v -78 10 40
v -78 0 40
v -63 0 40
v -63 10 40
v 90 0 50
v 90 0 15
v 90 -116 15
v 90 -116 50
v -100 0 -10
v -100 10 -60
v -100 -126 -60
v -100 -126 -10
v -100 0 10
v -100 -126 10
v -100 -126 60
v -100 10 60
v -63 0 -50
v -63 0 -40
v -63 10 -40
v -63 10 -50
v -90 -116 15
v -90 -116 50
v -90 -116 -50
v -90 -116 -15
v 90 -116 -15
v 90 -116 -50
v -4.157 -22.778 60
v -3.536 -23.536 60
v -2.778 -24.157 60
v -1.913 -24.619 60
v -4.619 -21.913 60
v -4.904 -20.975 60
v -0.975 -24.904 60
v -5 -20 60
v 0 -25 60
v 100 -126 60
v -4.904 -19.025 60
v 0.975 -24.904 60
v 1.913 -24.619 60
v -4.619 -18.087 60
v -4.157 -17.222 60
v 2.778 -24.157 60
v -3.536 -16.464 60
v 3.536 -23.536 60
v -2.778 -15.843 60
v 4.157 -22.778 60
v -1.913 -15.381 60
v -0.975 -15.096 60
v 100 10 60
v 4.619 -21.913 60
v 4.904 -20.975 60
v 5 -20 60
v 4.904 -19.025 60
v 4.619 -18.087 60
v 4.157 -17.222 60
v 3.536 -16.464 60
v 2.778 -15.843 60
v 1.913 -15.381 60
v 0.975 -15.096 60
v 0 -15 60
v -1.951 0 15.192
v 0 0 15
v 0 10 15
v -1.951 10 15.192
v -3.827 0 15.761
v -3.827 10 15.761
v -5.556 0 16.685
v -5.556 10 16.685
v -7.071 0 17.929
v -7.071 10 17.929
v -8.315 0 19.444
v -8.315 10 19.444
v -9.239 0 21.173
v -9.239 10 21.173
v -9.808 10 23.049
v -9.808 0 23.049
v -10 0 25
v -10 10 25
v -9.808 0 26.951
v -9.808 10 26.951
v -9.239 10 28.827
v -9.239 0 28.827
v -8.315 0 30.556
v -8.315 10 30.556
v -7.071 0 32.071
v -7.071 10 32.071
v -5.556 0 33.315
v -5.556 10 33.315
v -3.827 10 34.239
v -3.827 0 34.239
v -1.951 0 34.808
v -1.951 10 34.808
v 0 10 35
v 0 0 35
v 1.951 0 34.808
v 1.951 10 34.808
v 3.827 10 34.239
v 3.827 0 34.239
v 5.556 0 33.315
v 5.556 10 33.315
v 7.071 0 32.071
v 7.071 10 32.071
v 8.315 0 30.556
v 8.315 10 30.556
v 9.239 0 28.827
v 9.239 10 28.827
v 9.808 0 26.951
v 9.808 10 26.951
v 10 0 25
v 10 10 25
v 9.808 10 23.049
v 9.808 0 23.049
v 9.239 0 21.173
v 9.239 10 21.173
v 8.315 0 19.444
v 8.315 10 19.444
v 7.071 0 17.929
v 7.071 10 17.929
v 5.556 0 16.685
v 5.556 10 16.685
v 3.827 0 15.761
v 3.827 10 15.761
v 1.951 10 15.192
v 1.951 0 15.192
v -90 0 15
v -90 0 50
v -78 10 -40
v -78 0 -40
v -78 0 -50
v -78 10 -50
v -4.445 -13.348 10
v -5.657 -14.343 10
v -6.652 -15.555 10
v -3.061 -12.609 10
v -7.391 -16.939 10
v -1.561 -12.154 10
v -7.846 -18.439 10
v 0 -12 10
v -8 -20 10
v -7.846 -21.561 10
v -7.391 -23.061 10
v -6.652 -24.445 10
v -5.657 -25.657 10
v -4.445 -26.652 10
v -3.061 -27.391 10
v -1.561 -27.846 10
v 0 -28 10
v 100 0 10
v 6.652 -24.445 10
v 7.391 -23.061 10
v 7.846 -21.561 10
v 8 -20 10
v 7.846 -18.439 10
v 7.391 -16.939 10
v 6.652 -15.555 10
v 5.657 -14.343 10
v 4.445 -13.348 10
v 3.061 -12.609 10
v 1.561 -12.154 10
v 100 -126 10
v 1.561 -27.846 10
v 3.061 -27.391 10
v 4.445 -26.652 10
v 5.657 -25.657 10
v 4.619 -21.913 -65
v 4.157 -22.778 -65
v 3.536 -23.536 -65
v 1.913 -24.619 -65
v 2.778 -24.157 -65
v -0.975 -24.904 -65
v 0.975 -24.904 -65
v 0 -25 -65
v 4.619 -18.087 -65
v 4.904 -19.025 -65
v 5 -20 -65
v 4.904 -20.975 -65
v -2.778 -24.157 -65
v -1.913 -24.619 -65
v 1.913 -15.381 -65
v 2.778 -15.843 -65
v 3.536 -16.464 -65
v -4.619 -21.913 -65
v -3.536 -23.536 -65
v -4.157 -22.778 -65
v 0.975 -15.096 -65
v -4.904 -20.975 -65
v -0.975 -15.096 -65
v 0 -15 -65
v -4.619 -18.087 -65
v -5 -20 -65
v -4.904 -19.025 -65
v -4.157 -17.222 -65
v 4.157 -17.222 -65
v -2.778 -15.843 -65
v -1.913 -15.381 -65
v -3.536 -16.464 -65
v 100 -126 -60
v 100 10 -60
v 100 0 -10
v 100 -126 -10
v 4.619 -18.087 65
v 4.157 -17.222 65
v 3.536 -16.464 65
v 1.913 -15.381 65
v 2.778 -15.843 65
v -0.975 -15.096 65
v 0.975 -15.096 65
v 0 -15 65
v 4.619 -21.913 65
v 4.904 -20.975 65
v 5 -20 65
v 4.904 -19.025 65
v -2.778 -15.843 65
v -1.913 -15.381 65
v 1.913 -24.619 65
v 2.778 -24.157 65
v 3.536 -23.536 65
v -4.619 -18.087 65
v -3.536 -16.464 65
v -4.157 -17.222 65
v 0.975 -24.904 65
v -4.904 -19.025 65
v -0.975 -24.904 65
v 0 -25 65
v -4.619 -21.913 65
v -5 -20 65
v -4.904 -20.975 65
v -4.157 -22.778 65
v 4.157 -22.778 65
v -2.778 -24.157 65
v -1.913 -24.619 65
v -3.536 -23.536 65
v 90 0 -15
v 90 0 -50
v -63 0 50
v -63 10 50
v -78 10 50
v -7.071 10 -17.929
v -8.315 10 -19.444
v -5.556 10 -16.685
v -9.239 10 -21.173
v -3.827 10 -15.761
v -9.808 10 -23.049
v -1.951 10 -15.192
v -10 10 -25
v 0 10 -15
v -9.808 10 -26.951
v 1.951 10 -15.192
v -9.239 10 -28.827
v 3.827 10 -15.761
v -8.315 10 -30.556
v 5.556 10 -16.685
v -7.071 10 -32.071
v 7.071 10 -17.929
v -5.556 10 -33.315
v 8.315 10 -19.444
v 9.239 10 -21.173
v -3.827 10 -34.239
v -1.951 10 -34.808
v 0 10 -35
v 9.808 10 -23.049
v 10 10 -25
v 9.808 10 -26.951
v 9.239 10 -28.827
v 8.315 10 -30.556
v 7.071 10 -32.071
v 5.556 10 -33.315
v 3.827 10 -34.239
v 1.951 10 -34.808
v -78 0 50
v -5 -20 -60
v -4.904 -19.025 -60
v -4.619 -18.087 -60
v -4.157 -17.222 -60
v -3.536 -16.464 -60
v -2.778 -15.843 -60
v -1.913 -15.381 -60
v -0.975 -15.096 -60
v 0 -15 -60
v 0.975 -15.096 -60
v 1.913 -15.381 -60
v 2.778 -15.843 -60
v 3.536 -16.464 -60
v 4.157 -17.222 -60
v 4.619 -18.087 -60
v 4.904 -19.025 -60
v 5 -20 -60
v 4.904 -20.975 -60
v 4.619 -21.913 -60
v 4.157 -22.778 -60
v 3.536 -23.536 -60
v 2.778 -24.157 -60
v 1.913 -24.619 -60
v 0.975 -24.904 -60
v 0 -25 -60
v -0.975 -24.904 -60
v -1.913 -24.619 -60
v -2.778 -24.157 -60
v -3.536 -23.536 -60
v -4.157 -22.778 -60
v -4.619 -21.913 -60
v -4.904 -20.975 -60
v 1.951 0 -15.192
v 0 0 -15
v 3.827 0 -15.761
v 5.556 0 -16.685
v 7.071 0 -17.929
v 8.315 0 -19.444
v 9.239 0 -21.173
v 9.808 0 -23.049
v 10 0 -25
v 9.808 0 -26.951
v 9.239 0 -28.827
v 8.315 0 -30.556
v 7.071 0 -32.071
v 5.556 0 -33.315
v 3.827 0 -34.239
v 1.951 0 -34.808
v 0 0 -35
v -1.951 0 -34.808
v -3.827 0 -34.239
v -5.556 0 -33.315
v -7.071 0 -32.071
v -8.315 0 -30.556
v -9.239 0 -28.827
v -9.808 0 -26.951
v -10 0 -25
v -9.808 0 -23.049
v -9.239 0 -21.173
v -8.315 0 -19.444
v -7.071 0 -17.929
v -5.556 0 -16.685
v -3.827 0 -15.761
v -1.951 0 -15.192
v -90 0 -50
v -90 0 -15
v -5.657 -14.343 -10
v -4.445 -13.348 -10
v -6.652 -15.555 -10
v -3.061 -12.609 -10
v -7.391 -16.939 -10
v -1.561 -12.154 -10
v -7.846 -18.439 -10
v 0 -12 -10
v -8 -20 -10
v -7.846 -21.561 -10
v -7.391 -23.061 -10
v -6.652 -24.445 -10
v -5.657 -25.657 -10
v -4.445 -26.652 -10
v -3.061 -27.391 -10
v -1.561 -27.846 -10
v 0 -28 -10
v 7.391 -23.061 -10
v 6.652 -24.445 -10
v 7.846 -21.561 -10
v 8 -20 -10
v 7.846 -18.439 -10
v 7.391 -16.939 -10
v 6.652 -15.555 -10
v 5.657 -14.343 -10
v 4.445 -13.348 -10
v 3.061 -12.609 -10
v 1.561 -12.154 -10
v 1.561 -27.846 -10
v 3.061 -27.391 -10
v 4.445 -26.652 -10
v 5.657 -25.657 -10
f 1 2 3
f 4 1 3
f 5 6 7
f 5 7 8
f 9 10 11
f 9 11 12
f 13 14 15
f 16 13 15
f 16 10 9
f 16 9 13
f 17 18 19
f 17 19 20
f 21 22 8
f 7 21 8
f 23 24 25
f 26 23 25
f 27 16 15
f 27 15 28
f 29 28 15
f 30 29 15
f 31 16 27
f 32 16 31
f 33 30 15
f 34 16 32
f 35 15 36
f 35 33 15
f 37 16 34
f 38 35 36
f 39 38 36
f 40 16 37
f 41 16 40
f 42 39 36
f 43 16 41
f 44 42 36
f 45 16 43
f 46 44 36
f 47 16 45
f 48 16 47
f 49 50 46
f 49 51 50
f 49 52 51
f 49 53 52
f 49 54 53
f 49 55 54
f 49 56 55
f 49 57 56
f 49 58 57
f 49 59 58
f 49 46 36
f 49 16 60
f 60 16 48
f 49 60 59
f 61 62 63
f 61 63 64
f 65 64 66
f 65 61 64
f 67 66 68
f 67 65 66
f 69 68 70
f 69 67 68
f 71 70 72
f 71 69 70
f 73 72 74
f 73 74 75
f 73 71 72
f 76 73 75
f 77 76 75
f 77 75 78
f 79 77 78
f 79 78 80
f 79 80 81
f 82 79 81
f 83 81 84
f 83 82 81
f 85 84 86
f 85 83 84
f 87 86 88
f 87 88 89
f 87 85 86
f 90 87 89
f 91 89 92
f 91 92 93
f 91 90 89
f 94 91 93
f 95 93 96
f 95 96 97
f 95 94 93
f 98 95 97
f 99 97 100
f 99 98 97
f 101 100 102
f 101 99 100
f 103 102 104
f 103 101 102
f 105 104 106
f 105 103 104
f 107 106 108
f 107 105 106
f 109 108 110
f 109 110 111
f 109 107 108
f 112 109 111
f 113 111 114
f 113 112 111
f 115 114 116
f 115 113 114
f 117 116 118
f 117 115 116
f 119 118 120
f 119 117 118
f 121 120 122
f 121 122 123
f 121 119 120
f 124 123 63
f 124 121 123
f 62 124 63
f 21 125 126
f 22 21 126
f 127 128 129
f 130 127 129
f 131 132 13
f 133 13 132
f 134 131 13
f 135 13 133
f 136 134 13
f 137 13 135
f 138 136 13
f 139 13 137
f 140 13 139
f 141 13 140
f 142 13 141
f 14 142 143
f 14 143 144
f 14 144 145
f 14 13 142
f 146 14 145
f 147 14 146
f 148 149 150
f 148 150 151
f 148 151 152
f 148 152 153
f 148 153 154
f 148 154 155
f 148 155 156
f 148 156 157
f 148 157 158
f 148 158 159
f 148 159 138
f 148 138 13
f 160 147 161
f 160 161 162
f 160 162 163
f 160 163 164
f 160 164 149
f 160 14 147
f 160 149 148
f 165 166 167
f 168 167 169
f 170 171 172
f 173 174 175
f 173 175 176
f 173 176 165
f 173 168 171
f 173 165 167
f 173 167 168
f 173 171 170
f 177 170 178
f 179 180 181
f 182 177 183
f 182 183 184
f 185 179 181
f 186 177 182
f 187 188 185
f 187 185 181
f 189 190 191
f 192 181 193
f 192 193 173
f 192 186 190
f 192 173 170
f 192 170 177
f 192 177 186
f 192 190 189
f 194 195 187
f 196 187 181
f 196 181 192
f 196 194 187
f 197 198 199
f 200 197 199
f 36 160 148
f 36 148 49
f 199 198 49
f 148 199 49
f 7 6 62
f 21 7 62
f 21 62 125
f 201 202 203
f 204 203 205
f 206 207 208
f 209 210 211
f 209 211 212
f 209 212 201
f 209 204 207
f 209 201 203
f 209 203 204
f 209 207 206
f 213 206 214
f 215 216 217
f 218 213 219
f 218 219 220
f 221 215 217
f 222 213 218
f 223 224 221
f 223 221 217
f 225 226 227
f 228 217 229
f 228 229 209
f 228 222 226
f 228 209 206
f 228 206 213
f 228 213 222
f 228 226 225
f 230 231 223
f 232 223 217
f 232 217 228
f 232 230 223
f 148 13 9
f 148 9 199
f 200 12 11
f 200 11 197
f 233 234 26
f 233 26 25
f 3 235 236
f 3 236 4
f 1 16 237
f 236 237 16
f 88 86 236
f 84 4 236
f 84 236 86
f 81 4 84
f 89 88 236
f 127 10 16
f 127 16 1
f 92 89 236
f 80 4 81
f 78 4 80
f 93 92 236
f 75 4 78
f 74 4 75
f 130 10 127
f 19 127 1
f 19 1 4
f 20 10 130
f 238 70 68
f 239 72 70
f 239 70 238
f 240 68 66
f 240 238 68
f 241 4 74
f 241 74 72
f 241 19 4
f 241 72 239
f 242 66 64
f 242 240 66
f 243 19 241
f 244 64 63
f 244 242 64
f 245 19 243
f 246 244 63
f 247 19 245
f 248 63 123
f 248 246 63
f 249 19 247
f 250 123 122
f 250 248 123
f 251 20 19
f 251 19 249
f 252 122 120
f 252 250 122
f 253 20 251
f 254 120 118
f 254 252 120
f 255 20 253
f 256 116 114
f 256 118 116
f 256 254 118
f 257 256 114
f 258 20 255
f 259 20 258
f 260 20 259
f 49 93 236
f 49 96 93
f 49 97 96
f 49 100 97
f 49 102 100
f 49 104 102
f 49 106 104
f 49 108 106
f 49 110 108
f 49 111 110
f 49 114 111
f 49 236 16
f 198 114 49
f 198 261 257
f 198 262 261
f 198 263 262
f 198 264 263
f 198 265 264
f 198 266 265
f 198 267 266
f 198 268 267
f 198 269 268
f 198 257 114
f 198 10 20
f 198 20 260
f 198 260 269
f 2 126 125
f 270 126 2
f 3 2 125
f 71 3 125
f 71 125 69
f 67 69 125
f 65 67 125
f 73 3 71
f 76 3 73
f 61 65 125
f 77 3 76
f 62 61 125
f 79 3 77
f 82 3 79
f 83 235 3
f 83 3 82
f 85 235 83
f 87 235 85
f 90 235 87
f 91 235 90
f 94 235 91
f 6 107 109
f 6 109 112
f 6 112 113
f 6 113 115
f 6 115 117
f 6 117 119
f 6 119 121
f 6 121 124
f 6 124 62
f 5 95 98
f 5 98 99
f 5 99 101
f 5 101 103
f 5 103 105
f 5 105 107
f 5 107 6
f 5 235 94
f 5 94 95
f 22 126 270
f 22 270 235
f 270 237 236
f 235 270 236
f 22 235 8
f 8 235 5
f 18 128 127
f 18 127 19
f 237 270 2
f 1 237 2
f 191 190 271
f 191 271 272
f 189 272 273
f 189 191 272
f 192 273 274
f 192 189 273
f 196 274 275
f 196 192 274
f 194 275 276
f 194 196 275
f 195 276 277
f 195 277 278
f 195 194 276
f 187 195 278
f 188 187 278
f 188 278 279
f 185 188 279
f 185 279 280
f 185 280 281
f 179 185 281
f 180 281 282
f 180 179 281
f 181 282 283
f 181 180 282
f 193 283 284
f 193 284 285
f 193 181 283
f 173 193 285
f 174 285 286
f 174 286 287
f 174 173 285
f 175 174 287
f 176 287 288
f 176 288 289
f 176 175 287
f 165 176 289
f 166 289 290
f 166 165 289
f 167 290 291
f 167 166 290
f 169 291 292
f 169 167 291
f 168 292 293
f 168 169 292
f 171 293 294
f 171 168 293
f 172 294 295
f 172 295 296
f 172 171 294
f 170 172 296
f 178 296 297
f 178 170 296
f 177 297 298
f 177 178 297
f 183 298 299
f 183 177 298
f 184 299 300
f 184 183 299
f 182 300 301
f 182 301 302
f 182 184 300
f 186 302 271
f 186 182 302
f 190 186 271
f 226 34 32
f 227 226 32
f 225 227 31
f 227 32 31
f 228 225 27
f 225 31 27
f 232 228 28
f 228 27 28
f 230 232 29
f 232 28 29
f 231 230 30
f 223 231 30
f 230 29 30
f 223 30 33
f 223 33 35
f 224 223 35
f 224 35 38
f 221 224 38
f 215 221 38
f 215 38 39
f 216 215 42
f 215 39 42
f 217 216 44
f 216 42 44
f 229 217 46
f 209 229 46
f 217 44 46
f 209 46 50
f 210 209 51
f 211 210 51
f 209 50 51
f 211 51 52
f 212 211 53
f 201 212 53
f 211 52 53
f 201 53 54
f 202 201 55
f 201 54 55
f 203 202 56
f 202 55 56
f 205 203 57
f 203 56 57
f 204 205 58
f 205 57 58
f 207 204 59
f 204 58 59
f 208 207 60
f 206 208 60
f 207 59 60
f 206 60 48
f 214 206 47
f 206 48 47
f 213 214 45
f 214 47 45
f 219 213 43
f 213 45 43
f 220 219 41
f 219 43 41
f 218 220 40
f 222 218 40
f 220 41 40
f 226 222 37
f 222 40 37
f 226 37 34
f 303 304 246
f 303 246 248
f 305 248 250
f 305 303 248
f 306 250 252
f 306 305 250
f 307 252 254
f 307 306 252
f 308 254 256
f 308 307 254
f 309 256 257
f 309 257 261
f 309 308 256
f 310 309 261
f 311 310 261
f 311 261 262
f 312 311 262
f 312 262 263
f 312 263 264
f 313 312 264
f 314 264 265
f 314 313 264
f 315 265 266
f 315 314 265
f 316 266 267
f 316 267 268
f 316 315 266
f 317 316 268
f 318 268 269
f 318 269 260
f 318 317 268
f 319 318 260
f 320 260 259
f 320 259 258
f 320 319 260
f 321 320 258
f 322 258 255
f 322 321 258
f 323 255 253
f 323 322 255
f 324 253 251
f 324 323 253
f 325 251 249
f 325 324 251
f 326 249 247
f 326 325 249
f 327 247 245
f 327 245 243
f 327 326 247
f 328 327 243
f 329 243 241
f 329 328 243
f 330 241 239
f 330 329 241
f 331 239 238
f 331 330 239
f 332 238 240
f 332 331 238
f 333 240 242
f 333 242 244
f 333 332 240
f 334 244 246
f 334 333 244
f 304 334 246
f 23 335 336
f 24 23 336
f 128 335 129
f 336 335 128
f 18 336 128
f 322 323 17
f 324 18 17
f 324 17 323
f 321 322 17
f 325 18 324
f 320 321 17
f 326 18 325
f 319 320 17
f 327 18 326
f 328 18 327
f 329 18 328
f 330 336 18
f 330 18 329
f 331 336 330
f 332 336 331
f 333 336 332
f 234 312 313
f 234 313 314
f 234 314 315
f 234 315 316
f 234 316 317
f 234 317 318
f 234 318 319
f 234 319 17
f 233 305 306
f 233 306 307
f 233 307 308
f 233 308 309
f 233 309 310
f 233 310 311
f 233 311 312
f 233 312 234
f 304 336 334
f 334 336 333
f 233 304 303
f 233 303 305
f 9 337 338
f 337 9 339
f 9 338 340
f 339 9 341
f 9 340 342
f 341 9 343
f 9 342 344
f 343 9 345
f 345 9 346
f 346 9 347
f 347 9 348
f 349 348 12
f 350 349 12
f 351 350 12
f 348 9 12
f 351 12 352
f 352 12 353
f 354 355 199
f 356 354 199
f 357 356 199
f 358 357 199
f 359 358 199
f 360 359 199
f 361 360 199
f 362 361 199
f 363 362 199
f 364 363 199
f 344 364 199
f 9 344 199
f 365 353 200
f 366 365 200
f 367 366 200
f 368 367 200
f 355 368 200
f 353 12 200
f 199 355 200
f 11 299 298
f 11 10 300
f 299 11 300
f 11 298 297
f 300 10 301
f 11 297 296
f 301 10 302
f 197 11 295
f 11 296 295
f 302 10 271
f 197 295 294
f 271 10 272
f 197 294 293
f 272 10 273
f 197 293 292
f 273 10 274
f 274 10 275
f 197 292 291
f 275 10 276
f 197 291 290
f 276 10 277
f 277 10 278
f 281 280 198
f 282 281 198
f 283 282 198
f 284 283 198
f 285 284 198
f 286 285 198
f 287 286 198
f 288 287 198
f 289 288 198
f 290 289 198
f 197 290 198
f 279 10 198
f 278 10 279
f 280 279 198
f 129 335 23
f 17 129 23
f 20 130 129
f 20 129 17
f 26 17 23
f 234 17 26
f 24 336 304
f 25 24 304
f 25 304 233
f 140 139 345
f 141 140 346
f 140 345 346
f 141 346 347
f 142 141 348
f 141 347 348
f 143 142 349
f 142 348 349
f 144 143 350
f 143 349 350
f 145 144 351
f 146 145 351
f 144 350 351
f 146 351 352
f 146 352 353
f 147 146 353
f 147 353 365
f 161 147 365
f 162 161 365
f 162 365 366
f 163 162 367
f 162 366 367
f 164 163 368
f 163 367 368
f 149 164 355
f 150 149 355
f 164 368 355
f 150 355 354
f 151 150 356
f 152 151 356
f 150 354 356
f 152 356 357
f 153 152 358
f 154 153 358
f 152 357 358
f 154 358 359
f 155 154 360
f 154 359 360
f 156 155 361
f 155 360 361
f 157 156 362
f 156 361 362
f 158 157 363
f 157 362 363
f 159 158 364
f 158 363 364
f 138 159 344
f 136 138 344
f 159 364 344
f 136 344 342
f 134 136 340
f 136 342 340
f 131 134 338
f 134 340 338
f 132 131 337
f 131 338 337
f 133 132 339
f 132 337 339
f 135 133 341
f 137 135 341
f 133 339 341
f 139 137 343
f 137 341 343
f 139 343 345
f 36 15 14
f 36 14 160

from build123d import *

# Parameters (mm, degrees)
SKETCH_1_W          = 200
SKETCH_1_H          = 120
SKETCH_1_R          = 10
SKETCH_1_W_2        = 15
SKETCH_1_H_2        = 10
EXTRUDE_1_DEPTH     = 10
SKETCH_2_W          = 200
SKETCH_2_H          = 120
SKETCH_2_W_2        = 180
SKETCH_2_H_2        = 100
EXTRUDE_2_DEPTH     = 116
SKETCH_4_W          = 200
SKETCH_4_H          = 120
EXTRUDE_3_DEPTH     = 10
SKETCH_6_W          = 200
SKETCH_6_H          = 20
CUT_EXTRUDE_1_DEPTH = 126
SKETCH_7_W          = 200
SKETCH_7_H          = 126
EXTRUDE_4_DEPTH     = 5
SKETCH_8_W          = 200
SKETCH_8_H          = 126
EXTRUDE_5_DEPTH     = 5
SKETCH_9_R          = 8
EXTRUDE_6_DEPTH     = 20
SKETCH_10_R         = 5
EXTRUDE_7_DEPTH     = 5
EXTRUDE_START       = 5
SKETCH_11_R         = 5
EXTRUDE_8_DEPTH     = 5


with BuildPart() as part:
    # 草图1 → 凸台-拉伸1 (new body)
    with BuildSketch(Plane(origin=(0, 0, 0), x_dir=(1, 0, 0), z_dir=(0, 1, 0))):
        Rectangle(SKETCH_1_W, SKETCH_1_H)
        with Locations(Location((0, 25, 0), (0, 0, 270))):
            Circle(SKETCH_1_R, mode=Mode.SUBTRACT)
        with Locations(Location((0, -25, 0), (0, 0, 90))):
            Circle(SKETCH_1_R, mode=Mode.SUBTRACT)
        with Locations((-70.5, 45)):
            Rectangle(SKETCH_1_W_2, SKETCH_1_H_2, mode=Mode.SUBTRACT)
        with Locations((-70.5, -45)):
            Rectangle(SKETCH_1_W_2, SKETCH_1_H_2, mode=Mode.SUBTRACT)
    extrude(amount=EXTRUDE_1_DEPTH)

    # 草图2 → 凸台-拉伸2 (add)
    with BuildSketch(Plane.XZ):
        Rectangle(SKETCH_2_W, SKETCH_2_H)
        Rectangle(SKETCH_2_W_2, SKETCH_2_H_2, mode=Mode.SUBTRACT)
    extrude(amount=EXTRUDE_2_DEPTH)

    # 草图4 → 凸台-拉伸3 (add)
    with BuildSketch(Plane.XZ.offset(116)):
        Rectangle(SKETCH_4_W, SKETCH_4_H)
    extrude(amount=EXTRUDE_3_DEPTH)

    # 草图6 → 切除-拉伸1 (cut)
    with BuildSketch(Plane.XZ.offset(126)):
        Rectangle(SKETCH_6_W, SKETCH_6_H)
    extrude(amount=-CUT_EXTRUDE_1_DEPTH, mode=Mode.SUBTRACT)

    # 草图7 → 凸台-拉伸4 (add)
    with BuildSketch(Plane(origin=(0, 0, 10), x_dir=(-1, 0, 0), z_dir=(0, 0, -1))):
        with Locations((0, -63)):
            Rectangle(SKETCH_7_W, SKETCH_7_H)
    extrude(amount=-EXTRUDE_4_DEPTH)

    # 草图8 → 凸台-拉伸5 (add)
    with BuildSketch(Plane.XY.offset(-10)):
        with Locations((0, -63)):
            Rectangle(SKETCH_8_W, SKETCH_8_H)
    extrude(amount=-EXTRUDE_5_DEPTH)

    # 草图9 → 凸台-拉伸6 (add)
    with BuildSketch(Plane.XY.offset(-10)):
        with Locations(Location((0, -20, 0), (0, 0, 180))):
            Circle(SKETCH_9_R)
    extrude(amount=EXTRUDE_6_DEPTH)

    # 草图10 → 凸台-拉伸7 (add)
    with BuildSketch(Plane.XY.offset(60)):
        with Locations(Location((0, -20, 0), (0, 0, 180))):
            Circle(SKETCH_10_R)
    extrude(amount=EXTRUDE_7_DEPTH)

    # 草图11 → 凸台-拉伸8 (add)
    with BuildSketch(Plane(origin=(0, 0, -60), x_dir=(-1, 0, 0), z_dir=(0, 0, -1)).offset(EXTRUDE_START)):
        with Locations((0, -20)):
            Circle(SKETCH_11_R)
    extrude(amount=-EXTRUDE_8_DEPTH)


solid = part.part
